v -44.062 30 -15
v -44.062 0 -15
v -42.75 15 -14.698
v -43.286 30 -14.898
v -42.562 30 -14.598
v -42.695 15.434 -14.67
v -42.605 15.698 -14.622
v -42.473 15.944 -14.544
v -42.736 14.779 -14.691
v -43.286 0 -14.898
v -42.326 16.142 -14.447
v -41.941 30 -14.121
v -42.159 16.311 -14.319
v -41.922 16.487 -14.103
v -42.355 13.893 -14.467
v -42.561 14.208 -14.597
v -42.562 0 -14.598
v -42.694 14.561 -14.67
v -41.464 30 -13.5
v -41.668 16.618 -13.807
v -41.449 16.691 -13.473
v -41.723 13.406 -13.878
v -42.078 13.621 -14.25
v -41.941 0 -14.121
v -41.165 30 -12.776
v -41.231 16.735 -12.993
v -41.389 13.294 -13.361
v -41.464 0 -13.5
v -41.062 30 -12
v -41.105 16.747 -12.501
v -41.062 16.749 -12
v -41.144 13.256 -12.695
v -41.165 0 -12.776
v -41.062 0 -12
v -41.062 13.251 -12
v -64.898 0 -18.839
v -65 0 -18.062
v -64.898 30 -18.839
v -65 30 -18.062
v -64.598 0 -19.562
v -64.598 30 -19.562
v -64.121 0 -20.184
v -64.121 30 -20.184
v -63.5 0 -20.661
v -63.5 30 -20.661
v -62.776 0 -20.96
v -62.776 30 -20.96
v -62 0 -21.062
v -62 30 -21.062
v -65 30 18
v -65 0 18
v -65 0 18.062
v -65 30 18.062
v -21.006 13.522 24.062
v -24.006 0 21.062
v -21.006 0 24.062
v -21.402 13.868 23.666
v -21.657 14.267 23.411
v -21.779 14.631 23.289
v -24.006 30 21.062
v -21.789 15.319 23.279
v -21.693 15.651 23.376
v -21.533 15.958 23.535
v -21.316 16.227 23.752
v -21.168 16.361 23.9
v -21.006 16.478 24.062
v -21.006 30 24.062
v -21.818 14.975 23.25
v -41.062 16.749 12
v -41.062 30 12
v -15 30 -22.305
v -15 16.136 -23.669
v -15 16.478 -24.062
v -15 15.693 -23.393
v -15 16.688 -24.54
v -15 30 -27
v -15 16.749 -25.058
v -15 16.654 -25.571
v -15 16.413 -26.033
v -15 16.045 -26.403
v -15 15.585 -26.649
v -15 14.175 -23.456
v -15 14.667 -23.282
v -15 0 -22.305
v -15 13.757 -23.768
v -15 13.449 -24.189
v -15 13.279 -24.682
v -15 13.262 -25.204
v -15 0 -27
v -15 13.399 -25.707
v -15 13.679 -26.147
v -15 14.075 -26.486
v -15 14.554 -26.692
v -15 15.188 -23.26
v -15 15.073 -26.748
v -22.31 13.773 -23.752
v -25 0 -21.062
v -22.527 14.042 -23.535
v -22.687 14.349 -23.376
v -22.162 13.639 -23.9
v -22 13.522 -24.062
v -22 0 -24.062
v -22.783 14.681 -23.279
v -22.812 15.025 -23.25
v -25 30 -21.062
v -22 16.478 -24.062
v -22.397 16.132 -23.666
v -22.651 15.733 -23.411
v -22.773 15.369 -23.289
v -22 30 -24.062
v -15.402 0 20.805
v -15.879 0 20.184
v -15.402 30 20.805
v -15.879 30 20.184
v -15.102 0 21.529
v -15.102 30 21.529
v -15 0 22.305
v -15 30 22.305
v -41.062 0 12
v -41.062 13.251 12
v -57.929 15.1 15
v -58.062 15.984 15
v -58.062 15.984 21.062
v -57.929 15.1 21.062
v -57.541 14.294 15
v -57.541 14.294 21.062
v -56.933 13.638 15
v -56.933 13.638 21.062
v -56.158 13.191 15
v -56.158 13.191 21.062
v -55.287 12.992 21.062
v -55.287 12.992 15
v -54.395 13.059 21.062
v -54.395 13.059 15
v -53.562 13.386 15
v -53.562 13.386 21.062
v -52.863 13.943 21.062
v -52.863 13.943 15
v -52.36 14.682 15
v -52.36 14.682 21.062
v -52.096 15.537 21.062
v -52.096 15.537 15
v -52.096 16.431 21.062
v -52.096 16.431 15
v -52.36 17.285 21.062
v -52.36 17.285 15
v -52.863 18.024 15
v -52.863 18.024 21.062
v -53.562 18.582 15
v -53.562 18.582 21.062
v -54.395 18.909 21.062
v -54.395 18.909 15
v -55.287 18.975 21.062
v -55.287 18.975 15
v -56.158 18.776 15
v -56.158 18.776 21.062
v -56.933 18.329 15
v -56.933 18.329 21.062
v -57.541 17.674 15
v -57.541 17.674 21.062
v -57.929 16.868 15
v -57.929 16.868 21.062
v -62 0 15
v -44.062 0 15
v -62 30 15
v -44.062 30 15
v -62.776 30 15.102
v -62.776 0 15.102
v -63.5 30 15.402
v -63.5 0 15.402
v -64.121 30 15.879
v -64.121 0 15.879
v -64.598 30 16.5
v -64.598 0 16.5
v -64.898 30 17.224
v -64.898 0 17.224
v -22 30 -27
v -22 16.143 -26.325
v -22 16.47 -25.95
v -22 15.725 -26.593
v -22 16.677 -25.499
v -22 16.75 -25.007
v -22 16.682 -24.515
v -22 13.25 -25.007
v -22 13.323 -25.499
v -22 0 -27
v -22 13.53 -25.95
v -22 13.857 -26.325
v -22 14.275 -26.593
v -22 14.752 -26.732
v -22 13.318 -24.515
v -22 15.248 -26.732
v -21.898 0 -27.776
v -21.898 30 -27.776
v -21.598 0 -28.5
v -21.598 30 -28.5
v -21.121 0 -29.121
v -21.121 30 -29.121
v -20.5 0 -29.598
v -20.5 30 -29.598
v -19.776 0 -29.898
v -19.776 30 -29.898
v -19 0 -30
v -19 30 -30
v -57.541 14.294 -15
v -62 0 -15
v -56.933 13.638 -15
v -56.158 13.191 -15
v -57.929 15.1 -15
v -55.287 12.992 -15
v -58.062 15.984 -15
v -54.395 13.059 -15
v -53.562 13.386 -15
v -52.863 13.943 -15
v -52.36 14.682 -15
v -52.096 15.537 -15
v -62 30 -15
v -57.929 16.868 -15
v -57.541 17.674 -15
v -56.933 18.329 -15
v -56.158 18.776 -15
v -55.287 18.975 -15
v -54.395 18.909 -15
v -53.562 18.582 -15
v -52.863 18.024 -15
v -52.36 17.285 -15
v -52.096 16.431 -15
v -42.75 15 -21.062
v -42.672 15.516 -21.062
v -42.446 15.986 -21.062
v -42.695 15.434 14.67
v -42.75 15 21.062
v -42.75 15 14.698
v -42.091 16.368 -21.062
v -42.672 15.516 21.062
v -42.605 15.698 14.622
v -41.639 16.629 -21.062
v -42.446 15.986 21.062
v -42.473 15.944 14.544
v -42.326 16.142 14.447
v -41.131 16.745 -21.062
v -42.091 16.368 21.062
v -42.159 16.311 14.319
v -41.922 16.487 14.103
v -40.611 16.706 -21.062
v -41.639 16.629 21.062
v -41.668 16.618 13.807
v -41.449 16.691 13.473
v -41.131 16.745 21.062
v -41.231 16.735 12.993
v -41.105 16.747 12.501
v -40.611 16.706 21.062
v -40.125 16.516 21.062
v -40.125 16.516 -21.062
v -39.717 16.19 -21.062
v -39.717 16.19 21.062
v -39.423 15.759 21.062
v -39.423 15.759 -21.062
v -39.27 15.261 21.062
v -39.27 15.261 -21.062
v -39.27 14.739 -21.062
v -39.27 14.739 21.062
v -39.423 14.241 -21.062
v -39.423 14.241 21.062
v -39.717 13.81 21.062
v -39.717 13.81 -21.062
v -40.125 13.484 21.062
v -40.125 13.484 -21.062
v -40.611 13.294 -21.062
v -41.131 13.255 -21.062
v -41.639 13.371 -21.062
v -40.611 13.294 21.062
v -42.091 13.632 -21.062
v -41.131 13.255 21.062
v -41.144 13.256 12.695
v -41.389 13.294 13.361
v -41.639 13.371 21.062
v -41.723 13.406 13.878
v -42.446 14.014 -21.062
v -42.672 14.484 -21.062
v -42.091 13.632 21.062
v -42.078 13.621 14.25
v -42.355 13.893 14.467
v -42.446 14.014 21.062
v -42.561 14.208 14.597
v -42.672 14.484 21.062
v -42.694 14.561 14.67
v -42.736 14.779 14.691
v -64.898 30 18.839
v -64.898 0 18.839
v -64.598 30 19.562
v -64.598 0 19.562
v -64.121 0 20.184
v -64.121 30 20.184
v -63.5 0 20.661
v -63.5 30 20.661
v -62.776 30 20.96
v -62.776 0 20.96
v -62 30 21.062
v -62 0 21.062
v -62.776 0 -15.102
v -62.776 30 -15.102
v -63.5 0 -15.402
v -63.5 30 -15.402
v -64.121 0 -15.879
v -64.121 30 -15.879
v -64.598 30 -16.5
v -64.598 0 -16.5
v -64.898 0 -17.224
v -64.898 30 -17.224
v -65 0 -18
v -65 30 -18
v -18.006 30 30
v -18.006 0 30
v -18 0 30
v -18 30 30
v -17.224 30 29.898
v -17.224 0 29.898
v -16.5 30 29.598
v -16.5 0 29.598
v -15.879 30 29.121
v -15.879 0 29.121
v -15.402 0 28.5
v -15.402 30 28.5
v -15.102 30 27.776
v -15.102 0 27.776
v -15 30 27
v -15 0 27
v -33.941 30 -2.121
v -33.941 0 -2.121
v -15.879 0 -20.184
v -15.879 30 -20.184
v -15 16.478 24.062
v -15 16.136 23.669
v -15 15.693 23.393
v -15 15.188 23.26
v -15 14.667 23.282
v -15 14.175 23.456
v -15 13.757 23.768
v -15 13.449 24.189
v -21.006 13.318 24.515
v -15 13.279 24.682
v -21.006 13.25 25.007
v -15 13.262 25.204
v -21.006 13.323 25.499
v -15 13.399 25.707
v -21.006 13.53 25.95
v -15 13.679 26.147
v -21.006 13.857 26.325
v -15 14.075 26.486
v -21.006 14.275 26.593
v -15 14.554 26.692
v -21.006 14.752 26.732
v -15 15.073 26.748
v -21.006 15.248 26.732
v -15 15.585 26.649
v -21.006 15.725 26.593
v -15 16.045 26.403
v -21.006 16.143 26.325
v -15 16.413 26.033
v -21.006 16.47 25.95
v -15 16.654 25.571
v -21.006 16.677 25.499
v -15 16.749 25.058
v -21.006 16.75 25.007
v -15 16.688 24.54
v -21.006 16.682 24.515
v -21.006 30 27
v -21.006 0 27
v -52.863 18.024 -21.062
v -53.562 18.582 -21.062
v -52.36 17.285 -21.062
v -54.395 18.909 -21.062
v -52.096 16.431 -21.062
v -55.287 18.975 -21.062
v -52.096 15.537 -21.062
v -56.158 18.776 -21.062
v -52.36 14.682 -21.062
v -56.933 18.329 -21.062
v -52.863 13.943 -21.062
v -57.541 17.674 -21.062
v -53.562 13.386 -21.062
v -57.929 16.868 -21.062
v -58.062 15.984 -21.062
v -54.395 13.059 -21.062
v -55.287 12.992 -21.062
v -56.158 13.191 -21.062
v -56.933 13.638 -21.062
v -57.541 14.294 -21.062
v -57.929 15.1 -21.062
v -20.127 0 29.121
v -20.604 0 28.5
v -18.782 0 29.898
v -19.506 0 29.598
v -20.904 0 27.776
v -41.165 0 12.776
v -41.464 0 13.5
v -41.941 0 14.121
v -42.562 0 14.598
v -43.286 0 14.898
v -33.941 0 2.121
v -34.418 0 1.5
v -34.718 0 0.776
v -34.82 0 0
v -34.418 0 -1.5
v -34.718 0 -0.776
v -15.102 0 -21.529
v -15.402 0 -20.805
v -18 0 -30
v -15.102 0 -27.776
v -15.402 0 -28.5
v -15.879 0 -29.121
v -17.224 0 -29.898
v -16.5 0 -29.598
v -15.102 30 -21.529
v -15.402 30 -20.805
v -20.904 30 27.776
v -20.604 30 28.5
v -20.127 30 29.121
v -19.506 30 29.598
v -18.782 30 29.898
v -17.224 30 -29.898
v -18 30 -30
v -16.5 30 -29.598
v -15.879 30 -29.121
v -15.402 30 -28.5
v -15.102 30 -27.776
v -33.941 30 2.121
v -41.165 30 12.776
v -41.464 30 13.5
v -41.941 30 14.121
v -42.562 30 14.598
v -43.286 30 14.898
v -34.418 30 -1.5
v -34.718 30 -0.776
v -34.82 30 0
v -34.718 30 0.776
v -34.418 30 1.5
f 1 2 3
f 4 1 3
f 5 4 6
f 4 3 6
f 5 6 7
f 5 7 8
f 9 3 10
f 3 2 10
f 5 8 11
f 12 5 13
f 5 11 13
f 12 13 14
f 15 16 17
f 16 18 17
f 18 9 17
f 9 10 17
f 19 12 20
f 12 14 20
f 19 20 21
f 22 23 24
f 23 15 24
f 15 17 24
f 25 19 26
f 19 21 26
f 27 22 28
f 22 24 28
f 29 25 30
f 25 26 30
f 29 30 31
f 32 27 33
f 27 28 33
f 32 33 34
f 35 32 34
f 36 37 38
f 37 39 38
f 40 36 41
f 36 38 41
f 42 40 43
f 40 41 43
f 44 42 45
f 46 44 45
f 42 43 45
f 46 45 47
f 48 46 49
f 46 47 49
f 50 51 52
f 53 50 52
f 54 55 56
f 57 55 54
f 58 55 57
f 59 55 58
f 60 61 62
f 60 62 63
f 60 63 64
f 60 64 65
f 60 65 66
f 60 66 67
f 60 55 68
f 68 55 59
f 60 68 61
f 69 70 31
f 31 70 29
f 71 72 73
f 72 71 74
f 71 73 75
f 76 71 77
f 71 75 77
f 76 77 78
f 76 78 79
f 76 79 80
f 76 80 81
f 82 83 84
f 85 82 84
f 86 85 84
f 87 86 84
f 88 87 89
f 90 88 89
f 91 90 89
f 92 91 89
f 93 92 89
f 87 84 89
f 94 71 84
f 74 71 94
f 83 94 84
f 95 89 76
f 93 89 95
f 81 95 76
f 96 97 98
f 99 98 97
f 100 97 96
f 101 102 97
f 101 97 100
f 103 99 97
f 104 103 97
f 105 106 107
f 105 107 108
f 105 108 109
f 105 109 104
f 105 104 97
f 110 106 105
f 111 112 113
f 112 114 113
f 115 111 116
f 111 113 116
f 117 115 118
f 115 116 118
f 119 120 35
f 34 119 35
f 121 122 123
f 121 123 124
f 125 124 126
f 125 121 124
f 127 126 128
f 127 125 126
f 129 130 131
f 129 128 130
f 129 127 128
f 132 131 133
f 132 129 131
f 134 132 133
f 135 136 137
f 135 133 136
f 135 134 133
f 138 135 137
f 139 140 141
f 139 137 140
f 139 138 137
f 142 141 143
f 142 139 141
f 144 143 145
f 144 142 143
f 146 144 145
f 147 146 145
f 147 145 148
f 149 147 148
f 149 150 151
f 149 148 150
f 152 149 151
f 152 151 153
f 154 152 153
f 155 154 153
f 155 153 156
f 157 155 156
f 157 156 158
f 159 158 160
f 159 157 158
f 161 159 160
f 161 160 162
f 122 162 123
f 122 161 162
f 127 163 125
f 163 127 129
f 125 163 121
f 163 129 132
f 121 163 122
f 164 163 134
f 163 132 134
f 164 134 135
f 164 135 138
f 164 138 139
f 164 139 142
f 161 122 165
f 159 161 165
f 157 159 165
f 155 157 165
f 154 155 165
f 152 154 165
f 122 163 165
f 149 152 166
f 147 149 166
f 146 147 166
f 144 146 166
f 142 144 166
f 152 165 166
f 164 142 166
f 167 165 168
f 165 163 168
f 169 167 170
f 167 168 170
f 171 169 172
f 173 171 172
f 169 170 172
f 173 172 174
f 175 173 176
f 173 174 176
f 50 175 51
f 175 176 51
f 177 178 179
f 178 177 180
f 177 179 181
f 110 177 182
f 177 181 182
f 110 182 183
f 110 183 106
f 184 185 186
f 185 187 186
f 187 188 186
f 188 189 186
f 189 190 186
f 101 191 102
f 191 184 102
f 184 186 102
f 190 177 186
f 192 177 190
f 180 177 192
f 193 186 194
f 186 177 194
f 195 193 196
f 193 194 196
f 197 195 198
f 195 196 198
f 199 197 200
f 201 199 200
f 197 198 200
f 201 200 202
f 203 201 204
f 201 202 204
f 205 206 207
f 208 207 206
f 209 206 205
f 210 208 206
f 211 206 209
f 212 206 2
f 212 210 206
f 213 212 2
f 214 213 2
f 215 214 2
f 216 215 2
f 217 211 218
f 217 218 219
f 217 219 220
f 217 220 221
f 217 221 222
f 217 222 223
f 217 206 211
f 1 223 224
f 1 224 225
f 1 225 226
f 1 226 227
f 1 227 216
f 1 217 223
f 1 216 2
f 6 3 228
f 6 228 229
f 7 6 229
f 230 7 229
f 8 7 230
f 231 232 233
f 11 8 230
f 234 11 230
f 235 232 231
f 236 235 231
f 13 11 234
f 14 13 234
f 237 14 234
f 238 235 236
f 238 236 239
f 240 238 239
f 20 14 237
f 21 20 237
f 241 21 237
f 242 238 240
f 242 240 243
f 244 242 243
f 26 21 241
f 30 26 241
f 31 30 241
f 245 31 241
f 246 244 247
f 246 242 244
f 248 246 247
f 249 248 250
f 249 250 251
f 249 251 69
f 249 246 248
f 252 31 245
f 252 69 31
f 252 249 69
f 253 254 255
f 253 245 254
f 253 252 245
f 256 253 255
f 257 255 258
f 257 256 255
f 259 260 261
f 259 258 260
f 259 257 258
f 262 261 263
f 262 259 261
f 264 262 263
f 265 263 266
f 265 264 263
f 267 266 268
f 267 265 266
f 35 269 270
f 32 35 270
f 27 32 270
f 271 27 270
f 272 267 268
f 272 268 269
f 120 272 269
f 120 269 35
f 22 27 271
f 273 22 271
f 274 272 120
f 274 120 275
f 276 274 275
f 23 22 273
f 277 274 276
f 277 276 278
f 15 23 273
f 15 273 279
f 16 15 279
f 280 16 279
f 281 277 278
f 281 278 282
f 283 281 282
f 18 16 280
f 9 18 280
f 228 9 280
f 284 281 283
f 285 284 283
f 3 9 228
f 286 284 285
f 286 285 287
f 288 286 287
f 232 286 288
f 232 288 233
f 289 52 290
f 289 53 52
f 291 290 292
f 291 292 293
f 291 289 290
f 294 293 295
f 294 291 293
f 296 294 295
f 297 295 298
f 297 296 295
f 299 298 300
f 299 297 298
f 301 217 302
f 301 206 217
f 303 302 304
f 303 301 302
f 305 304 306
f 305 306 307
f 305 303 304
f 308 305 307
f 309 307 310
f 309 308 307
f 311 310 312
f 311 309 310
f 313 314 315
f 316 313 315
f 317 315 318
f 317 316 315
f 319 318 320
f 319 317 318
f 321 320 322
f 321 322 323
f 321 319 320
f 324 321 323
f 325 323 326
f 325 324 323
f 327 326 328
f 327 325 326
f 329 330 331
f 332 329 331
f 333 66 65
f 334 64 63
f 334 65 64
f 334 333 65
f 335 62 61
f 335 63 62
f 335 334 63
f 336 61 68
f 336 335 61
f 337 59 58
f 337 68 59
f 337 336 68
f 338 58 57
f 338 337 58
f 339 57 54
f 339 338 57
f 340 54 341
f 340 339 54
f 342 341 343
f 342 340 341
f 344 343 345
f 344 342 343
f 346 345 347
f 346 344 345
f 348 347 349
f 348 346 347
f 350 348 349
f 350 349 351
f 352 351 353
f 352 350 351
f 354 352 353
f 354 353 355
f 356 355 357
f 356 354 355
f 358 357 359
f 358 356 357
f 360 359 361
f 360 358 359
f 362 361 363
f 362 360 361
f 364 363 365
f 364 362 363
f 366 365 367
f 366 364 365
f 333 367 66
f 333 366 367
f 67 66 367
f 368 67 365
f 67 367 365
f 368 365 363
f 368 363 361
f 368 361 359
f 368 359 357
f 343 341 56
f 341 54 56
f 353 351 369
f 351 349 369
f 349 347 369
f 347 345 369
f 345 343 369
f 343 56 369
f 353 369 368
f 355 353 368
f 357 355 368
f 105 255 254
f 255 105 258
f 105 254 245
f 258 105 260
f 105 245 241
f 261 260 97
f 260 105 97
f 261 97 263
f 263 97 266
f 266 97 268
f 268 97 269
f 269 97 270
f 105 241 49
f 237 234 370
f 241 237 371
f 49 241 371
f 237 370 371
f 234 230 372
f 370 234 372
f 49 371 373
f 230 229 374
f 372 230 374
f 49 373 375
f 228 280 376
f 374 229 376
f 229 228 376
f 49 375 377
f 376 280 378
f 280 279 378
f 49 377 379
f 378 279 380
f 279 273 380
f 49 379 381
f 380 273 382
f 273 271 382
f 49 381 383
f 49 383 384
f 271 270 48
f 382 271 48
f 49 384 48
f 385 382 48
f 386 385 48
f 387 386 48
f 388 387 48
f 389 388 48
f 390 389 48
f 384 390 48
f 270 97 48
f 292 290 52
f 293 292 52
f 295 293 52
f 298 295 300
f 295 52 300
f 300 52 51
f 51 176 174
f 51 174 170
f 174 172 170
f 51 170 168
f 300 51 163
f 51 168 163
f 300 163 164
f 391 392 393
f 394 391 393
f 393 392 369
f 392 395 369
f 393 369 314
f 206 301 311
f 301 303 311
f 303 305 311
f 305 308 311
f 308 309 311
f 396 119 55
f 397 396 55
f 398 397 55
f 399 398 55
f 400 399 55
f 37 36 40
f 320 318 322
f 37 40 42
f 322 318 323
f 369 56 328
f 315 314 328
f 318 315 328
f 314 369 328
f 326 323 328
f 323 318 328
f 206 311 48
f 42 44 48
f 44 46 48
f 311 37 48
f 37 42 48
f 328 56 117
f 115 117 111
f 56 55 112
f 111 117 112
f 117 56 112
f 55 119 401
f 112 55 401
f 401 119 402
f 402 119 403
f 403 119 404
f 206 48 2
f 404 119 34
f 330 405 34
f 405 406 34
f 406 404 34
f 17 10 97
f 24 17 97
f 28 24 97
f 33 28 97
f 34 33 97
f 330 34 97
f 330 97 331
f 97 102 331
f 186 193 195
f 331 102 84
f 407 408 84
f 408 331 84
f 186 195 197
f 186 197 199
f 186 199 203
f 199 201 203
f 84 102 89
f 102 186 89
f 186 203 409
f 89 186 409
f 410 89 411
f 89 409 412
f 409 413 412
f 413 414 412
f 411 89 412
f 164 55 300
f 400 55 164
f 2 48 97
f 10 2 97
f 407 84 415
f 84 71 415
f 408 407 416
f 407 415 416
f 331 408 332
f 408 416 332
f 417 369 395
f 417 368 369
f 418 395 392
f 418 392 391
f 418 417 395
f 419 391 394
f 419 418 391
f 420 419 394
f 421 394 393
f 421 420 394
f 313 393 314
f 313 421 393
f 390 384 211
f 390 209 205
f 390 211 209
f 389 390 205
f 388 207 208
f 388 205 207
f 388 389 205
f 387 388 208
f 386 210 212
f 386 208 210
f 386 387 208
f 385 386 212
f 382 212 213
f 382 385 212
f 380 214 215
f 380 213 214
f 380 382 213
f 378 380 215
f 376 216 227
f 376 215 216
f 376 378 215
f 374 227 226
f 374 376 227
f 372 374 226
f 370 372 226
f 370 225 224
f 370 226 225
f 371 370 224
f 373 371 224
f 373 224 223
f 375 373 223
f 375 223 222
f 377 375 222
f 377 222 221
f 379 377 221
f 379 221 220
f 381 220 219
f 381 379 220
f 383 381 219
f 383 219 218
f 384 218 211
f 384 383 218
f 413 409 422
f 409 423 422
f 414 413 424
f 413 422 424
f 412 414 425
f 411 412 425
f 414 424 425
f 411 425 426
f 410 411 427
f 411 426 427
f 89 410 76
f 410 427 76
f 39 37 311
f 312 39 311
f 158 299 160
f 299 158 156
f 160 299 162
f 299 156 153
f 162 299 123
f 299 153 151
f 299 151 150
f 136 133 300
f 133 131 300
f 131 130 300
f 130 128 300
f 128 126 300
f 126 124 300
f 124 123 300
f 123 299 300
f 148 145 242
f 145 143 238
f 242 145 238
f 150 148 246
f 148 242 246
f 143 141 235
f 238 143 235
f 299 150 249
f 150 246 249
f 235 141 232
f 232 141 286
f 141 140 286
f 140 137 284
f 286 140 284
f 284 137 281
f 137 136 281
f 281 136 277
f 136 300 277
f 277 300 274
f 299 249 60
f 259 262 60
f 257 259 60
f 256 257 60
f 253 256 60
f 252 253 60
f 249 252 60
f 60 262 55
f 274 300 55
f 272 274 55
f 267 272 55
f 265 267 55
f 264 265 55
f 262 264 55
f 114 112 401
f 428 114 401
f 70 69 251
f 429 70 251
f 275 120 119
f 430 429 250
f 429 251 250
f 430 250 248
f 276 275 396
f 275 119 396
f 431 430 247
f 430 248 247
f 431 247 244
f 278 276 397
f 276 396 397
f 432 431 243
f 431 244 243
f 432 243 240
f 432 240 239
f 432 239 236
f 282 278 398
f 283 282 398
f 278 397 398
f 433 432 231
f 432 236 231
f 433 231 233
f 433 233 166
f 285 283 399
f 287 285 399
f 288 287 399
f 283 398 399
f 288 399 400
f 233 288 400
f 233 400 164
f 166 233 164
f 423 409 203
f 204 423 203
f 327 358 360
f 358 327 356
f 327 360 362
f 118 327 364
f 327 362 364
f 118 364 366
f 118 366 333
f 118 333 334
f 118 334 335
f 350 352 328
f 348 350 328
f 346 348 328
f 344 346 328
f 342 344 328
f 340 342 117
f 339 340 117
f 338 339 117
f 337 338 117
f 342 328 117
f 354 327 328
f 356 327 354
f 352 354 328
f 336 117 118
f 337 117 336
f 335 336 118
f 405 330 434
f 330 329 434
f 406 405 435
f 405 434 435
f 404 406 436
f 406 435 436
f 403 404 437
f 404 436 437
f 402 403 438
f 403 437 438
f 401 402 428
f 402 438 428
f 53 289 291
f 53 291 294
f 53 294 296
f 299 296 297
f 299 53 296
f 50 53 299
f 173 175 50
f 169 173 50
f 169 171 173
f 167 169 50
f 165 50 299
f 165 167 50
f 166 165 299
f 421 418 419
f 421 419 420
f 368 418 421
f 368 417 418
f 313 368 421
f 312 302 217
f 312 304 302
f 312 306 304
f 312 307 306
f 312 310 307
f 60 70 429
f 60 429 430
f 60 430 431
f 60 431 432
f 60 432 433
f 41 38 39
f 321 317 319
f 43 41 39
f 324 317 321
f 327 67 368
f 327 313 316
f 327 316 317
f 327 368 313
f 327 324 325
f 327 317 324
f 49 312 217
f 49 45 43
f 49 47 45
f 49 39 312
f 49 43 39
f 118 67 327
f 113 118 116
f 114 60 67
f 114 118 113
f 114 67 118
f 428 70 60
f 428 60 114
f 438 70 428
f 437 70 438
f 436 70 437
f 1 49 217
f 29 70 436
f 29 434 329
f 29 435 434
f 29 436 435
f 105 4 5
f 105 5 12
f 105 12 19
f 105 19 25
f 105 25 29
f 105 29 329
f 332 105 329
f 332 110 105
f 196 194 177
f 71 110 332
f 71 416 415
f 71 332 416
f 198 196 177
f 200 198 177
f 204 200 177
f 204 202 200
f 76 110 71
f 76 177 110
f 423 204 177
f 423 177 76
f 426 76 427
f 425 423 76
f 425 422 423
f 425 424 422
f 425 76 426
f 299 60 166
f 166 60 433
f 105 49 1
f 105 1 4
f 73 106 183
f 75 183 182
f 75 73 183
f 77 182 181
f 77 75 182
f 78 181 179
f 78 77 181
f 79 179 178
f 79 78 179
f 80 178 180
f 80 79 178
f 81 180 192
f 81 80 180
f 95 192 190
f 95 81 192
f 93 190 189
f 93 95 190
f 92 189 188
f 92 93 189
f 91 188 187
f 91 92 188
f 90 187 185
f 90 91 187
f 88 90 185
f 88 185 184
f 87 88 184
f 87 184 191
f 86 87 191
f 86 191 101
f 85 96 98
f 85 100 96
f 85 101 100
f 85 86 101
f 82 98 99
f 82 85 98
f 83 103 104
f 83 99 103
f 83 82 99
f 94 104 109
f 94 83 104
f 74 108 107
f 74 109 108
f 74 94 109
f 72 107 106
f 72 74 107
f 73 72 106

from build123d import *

# Parameters (mm, degrees)
BOSS_EXTRUDE1_DEPTH     = 30
SKETCH2_W               = 30
SKETCH2_H               = 30
CUT_EXTRUDE1_DEPTH      = 30
CHAMFER1_SIZE           = 3
FILLET1_R               = 3
FILLET2_R               = 3
CUT_EXTRUDE2_DEPTH      = 30
CUT_EXTRUDE2_DEPTH_BACK = 30
SKETCH3_R               = 1.75
CUT_EXTRUDE3_DEPTH      = 50
CUT_EXTRUDE3_DEPTH_BACK = 30
SKETCH4_R               = 3
CUT_EXTRUDE4_DEPTH      = 88.933914818
CUT_EXTRUDE4_DEPTH_BACK = 88.933914818
SKETCH5_R               = 1.75


with BuildPart() as part:
    # Sketch1 → Boss-Extrude1 (new body)
    with BuildSketch(Plane(origin=(0, 0, 0), x_dir=(1, 0, 0), z_dir=(0, 1, 0))):
        Polygon((-65, 21.062445841), (-65, -21.062445841), (-21.005807434, -21.062445841), (-21.005807434, -30), (-15, -30), (-15, -21.062445841), (-36.062445841, 0), (-15, 21.062445841), (-15, 30), (-22, 30), (-22, 21.062445841), align=None)
    extrude(amount=BOSS_EXTRUDE1_DEPTH)

    # Sketch2 → Cut-Extrude1 (cut)
    with BuildSketch(Plane(origin=(0, 30, 0), x_dir=(1, 0, 0), z_dir=(0, 1, 0))):
        with Locations((-56.062445841, 0)):
            Rectangle(SKETCH2_W, SKETCH2_H)
    extrude(amount=-CUT_EXTRUDE1_DEPTH, mode=Mode.SUBTRACT)

    # Chamfer1
    chamfer1_edges = [part.edges().sort_by_distance(p)[0] for p in [
        (-21.005807434, 15, 21.062445841),
        (-22, 15, -21.062445841),
    ]]
    chamfer(chamfer1_edges, length=CHAMFER1_SIZE)

    # Fillet1
    fillet1_edges = [part.edges().sort_by_distance(p)[0] for p in [
        (-36.062445841, 15, 0),
        (-15, 15, 21.062445841),
        (-15, 15, -21.062445841),
        (-41.062445841, 15, 15),
        (-41.062445841, 15, -15),
    ]]
    fillet(fillet1_edges, radius=FILLET1_R)

    # Fillet2
    fillet2_edges = [part.edges().sort_by_distance(p)[0] for p in [
        (-15, 15, 30),
        (-21.005807434, 15, 30),
        (-65, 15, 21.062445841),
        (-65, 15, -21.062445841),
        (-22, 15, -30),
        (-15, 15, -30),
        (-65, 15, 15),
        (-65, 15, -15),
    ]]
    fillet(fillet2_edges, radius=FILLET2_R)

    # Sketch3 → Cut-Extrude2 (cut, two sides: drawn at the far end of the back side and taken through both)
    with BuildSketch(Plane.ZY.offset(22).offset(-CUT_EXTRUDE2_DEPTH_BACK)):
        with Locations(Location((-25, 15, 0), (0, 0, 57.605534529))):
            Circle(SKETCH3_R)
        with Locations(Location((25, 15, 0), (0, 0, 122.394465471))):
            Circle(SKETCH3_R)
    extrude(amount=CUT_EXTRUDE2_DEPTH + CUT_EXTRUDE2_DEPTH_BACK, mode=Mode.SUBTRACT)

    # Sketch4 → Cut-Extrude3 (cut, two sides: drawn at the far end of the back side and taken through both)
    with BuildSketch(Plane.XY.offset(-15).offset(-CUT_EXTRUDE3_DEPTH_BACK)):
        with Locations(Location((-55.062445841, 15.983841749, 0), (0, 0, 180))):
            Circle(SKETCH4_R)
    extrude(amount=CUT_EXTRUDE3_DEPTH + CUT_EXTRUDE3_DEPTH_BACK, mode=Mode.SUBTRACT)

    # Sketch5 → Cut-Extrude4 (cut, two sides: drawn at the far end of the back side and taken through both)
    with BuildSketch(Plane(origin=(0, 0, -21.062445841), x_dir=(-1, 0, 0), z_dir=(0, 0, -1)).offset(-CUT_EXTRUDE4_DEPTH_BACK)):
        with Locations((41, 15)):
            Circle(SKETCH5_R)
    extrude(amount=CUT_EXTRUDE4_DEPTH + CUT_EXTRUDE4_DEPTH_BACK, mode=Mode.SUBTRACT)


solid = part.part
